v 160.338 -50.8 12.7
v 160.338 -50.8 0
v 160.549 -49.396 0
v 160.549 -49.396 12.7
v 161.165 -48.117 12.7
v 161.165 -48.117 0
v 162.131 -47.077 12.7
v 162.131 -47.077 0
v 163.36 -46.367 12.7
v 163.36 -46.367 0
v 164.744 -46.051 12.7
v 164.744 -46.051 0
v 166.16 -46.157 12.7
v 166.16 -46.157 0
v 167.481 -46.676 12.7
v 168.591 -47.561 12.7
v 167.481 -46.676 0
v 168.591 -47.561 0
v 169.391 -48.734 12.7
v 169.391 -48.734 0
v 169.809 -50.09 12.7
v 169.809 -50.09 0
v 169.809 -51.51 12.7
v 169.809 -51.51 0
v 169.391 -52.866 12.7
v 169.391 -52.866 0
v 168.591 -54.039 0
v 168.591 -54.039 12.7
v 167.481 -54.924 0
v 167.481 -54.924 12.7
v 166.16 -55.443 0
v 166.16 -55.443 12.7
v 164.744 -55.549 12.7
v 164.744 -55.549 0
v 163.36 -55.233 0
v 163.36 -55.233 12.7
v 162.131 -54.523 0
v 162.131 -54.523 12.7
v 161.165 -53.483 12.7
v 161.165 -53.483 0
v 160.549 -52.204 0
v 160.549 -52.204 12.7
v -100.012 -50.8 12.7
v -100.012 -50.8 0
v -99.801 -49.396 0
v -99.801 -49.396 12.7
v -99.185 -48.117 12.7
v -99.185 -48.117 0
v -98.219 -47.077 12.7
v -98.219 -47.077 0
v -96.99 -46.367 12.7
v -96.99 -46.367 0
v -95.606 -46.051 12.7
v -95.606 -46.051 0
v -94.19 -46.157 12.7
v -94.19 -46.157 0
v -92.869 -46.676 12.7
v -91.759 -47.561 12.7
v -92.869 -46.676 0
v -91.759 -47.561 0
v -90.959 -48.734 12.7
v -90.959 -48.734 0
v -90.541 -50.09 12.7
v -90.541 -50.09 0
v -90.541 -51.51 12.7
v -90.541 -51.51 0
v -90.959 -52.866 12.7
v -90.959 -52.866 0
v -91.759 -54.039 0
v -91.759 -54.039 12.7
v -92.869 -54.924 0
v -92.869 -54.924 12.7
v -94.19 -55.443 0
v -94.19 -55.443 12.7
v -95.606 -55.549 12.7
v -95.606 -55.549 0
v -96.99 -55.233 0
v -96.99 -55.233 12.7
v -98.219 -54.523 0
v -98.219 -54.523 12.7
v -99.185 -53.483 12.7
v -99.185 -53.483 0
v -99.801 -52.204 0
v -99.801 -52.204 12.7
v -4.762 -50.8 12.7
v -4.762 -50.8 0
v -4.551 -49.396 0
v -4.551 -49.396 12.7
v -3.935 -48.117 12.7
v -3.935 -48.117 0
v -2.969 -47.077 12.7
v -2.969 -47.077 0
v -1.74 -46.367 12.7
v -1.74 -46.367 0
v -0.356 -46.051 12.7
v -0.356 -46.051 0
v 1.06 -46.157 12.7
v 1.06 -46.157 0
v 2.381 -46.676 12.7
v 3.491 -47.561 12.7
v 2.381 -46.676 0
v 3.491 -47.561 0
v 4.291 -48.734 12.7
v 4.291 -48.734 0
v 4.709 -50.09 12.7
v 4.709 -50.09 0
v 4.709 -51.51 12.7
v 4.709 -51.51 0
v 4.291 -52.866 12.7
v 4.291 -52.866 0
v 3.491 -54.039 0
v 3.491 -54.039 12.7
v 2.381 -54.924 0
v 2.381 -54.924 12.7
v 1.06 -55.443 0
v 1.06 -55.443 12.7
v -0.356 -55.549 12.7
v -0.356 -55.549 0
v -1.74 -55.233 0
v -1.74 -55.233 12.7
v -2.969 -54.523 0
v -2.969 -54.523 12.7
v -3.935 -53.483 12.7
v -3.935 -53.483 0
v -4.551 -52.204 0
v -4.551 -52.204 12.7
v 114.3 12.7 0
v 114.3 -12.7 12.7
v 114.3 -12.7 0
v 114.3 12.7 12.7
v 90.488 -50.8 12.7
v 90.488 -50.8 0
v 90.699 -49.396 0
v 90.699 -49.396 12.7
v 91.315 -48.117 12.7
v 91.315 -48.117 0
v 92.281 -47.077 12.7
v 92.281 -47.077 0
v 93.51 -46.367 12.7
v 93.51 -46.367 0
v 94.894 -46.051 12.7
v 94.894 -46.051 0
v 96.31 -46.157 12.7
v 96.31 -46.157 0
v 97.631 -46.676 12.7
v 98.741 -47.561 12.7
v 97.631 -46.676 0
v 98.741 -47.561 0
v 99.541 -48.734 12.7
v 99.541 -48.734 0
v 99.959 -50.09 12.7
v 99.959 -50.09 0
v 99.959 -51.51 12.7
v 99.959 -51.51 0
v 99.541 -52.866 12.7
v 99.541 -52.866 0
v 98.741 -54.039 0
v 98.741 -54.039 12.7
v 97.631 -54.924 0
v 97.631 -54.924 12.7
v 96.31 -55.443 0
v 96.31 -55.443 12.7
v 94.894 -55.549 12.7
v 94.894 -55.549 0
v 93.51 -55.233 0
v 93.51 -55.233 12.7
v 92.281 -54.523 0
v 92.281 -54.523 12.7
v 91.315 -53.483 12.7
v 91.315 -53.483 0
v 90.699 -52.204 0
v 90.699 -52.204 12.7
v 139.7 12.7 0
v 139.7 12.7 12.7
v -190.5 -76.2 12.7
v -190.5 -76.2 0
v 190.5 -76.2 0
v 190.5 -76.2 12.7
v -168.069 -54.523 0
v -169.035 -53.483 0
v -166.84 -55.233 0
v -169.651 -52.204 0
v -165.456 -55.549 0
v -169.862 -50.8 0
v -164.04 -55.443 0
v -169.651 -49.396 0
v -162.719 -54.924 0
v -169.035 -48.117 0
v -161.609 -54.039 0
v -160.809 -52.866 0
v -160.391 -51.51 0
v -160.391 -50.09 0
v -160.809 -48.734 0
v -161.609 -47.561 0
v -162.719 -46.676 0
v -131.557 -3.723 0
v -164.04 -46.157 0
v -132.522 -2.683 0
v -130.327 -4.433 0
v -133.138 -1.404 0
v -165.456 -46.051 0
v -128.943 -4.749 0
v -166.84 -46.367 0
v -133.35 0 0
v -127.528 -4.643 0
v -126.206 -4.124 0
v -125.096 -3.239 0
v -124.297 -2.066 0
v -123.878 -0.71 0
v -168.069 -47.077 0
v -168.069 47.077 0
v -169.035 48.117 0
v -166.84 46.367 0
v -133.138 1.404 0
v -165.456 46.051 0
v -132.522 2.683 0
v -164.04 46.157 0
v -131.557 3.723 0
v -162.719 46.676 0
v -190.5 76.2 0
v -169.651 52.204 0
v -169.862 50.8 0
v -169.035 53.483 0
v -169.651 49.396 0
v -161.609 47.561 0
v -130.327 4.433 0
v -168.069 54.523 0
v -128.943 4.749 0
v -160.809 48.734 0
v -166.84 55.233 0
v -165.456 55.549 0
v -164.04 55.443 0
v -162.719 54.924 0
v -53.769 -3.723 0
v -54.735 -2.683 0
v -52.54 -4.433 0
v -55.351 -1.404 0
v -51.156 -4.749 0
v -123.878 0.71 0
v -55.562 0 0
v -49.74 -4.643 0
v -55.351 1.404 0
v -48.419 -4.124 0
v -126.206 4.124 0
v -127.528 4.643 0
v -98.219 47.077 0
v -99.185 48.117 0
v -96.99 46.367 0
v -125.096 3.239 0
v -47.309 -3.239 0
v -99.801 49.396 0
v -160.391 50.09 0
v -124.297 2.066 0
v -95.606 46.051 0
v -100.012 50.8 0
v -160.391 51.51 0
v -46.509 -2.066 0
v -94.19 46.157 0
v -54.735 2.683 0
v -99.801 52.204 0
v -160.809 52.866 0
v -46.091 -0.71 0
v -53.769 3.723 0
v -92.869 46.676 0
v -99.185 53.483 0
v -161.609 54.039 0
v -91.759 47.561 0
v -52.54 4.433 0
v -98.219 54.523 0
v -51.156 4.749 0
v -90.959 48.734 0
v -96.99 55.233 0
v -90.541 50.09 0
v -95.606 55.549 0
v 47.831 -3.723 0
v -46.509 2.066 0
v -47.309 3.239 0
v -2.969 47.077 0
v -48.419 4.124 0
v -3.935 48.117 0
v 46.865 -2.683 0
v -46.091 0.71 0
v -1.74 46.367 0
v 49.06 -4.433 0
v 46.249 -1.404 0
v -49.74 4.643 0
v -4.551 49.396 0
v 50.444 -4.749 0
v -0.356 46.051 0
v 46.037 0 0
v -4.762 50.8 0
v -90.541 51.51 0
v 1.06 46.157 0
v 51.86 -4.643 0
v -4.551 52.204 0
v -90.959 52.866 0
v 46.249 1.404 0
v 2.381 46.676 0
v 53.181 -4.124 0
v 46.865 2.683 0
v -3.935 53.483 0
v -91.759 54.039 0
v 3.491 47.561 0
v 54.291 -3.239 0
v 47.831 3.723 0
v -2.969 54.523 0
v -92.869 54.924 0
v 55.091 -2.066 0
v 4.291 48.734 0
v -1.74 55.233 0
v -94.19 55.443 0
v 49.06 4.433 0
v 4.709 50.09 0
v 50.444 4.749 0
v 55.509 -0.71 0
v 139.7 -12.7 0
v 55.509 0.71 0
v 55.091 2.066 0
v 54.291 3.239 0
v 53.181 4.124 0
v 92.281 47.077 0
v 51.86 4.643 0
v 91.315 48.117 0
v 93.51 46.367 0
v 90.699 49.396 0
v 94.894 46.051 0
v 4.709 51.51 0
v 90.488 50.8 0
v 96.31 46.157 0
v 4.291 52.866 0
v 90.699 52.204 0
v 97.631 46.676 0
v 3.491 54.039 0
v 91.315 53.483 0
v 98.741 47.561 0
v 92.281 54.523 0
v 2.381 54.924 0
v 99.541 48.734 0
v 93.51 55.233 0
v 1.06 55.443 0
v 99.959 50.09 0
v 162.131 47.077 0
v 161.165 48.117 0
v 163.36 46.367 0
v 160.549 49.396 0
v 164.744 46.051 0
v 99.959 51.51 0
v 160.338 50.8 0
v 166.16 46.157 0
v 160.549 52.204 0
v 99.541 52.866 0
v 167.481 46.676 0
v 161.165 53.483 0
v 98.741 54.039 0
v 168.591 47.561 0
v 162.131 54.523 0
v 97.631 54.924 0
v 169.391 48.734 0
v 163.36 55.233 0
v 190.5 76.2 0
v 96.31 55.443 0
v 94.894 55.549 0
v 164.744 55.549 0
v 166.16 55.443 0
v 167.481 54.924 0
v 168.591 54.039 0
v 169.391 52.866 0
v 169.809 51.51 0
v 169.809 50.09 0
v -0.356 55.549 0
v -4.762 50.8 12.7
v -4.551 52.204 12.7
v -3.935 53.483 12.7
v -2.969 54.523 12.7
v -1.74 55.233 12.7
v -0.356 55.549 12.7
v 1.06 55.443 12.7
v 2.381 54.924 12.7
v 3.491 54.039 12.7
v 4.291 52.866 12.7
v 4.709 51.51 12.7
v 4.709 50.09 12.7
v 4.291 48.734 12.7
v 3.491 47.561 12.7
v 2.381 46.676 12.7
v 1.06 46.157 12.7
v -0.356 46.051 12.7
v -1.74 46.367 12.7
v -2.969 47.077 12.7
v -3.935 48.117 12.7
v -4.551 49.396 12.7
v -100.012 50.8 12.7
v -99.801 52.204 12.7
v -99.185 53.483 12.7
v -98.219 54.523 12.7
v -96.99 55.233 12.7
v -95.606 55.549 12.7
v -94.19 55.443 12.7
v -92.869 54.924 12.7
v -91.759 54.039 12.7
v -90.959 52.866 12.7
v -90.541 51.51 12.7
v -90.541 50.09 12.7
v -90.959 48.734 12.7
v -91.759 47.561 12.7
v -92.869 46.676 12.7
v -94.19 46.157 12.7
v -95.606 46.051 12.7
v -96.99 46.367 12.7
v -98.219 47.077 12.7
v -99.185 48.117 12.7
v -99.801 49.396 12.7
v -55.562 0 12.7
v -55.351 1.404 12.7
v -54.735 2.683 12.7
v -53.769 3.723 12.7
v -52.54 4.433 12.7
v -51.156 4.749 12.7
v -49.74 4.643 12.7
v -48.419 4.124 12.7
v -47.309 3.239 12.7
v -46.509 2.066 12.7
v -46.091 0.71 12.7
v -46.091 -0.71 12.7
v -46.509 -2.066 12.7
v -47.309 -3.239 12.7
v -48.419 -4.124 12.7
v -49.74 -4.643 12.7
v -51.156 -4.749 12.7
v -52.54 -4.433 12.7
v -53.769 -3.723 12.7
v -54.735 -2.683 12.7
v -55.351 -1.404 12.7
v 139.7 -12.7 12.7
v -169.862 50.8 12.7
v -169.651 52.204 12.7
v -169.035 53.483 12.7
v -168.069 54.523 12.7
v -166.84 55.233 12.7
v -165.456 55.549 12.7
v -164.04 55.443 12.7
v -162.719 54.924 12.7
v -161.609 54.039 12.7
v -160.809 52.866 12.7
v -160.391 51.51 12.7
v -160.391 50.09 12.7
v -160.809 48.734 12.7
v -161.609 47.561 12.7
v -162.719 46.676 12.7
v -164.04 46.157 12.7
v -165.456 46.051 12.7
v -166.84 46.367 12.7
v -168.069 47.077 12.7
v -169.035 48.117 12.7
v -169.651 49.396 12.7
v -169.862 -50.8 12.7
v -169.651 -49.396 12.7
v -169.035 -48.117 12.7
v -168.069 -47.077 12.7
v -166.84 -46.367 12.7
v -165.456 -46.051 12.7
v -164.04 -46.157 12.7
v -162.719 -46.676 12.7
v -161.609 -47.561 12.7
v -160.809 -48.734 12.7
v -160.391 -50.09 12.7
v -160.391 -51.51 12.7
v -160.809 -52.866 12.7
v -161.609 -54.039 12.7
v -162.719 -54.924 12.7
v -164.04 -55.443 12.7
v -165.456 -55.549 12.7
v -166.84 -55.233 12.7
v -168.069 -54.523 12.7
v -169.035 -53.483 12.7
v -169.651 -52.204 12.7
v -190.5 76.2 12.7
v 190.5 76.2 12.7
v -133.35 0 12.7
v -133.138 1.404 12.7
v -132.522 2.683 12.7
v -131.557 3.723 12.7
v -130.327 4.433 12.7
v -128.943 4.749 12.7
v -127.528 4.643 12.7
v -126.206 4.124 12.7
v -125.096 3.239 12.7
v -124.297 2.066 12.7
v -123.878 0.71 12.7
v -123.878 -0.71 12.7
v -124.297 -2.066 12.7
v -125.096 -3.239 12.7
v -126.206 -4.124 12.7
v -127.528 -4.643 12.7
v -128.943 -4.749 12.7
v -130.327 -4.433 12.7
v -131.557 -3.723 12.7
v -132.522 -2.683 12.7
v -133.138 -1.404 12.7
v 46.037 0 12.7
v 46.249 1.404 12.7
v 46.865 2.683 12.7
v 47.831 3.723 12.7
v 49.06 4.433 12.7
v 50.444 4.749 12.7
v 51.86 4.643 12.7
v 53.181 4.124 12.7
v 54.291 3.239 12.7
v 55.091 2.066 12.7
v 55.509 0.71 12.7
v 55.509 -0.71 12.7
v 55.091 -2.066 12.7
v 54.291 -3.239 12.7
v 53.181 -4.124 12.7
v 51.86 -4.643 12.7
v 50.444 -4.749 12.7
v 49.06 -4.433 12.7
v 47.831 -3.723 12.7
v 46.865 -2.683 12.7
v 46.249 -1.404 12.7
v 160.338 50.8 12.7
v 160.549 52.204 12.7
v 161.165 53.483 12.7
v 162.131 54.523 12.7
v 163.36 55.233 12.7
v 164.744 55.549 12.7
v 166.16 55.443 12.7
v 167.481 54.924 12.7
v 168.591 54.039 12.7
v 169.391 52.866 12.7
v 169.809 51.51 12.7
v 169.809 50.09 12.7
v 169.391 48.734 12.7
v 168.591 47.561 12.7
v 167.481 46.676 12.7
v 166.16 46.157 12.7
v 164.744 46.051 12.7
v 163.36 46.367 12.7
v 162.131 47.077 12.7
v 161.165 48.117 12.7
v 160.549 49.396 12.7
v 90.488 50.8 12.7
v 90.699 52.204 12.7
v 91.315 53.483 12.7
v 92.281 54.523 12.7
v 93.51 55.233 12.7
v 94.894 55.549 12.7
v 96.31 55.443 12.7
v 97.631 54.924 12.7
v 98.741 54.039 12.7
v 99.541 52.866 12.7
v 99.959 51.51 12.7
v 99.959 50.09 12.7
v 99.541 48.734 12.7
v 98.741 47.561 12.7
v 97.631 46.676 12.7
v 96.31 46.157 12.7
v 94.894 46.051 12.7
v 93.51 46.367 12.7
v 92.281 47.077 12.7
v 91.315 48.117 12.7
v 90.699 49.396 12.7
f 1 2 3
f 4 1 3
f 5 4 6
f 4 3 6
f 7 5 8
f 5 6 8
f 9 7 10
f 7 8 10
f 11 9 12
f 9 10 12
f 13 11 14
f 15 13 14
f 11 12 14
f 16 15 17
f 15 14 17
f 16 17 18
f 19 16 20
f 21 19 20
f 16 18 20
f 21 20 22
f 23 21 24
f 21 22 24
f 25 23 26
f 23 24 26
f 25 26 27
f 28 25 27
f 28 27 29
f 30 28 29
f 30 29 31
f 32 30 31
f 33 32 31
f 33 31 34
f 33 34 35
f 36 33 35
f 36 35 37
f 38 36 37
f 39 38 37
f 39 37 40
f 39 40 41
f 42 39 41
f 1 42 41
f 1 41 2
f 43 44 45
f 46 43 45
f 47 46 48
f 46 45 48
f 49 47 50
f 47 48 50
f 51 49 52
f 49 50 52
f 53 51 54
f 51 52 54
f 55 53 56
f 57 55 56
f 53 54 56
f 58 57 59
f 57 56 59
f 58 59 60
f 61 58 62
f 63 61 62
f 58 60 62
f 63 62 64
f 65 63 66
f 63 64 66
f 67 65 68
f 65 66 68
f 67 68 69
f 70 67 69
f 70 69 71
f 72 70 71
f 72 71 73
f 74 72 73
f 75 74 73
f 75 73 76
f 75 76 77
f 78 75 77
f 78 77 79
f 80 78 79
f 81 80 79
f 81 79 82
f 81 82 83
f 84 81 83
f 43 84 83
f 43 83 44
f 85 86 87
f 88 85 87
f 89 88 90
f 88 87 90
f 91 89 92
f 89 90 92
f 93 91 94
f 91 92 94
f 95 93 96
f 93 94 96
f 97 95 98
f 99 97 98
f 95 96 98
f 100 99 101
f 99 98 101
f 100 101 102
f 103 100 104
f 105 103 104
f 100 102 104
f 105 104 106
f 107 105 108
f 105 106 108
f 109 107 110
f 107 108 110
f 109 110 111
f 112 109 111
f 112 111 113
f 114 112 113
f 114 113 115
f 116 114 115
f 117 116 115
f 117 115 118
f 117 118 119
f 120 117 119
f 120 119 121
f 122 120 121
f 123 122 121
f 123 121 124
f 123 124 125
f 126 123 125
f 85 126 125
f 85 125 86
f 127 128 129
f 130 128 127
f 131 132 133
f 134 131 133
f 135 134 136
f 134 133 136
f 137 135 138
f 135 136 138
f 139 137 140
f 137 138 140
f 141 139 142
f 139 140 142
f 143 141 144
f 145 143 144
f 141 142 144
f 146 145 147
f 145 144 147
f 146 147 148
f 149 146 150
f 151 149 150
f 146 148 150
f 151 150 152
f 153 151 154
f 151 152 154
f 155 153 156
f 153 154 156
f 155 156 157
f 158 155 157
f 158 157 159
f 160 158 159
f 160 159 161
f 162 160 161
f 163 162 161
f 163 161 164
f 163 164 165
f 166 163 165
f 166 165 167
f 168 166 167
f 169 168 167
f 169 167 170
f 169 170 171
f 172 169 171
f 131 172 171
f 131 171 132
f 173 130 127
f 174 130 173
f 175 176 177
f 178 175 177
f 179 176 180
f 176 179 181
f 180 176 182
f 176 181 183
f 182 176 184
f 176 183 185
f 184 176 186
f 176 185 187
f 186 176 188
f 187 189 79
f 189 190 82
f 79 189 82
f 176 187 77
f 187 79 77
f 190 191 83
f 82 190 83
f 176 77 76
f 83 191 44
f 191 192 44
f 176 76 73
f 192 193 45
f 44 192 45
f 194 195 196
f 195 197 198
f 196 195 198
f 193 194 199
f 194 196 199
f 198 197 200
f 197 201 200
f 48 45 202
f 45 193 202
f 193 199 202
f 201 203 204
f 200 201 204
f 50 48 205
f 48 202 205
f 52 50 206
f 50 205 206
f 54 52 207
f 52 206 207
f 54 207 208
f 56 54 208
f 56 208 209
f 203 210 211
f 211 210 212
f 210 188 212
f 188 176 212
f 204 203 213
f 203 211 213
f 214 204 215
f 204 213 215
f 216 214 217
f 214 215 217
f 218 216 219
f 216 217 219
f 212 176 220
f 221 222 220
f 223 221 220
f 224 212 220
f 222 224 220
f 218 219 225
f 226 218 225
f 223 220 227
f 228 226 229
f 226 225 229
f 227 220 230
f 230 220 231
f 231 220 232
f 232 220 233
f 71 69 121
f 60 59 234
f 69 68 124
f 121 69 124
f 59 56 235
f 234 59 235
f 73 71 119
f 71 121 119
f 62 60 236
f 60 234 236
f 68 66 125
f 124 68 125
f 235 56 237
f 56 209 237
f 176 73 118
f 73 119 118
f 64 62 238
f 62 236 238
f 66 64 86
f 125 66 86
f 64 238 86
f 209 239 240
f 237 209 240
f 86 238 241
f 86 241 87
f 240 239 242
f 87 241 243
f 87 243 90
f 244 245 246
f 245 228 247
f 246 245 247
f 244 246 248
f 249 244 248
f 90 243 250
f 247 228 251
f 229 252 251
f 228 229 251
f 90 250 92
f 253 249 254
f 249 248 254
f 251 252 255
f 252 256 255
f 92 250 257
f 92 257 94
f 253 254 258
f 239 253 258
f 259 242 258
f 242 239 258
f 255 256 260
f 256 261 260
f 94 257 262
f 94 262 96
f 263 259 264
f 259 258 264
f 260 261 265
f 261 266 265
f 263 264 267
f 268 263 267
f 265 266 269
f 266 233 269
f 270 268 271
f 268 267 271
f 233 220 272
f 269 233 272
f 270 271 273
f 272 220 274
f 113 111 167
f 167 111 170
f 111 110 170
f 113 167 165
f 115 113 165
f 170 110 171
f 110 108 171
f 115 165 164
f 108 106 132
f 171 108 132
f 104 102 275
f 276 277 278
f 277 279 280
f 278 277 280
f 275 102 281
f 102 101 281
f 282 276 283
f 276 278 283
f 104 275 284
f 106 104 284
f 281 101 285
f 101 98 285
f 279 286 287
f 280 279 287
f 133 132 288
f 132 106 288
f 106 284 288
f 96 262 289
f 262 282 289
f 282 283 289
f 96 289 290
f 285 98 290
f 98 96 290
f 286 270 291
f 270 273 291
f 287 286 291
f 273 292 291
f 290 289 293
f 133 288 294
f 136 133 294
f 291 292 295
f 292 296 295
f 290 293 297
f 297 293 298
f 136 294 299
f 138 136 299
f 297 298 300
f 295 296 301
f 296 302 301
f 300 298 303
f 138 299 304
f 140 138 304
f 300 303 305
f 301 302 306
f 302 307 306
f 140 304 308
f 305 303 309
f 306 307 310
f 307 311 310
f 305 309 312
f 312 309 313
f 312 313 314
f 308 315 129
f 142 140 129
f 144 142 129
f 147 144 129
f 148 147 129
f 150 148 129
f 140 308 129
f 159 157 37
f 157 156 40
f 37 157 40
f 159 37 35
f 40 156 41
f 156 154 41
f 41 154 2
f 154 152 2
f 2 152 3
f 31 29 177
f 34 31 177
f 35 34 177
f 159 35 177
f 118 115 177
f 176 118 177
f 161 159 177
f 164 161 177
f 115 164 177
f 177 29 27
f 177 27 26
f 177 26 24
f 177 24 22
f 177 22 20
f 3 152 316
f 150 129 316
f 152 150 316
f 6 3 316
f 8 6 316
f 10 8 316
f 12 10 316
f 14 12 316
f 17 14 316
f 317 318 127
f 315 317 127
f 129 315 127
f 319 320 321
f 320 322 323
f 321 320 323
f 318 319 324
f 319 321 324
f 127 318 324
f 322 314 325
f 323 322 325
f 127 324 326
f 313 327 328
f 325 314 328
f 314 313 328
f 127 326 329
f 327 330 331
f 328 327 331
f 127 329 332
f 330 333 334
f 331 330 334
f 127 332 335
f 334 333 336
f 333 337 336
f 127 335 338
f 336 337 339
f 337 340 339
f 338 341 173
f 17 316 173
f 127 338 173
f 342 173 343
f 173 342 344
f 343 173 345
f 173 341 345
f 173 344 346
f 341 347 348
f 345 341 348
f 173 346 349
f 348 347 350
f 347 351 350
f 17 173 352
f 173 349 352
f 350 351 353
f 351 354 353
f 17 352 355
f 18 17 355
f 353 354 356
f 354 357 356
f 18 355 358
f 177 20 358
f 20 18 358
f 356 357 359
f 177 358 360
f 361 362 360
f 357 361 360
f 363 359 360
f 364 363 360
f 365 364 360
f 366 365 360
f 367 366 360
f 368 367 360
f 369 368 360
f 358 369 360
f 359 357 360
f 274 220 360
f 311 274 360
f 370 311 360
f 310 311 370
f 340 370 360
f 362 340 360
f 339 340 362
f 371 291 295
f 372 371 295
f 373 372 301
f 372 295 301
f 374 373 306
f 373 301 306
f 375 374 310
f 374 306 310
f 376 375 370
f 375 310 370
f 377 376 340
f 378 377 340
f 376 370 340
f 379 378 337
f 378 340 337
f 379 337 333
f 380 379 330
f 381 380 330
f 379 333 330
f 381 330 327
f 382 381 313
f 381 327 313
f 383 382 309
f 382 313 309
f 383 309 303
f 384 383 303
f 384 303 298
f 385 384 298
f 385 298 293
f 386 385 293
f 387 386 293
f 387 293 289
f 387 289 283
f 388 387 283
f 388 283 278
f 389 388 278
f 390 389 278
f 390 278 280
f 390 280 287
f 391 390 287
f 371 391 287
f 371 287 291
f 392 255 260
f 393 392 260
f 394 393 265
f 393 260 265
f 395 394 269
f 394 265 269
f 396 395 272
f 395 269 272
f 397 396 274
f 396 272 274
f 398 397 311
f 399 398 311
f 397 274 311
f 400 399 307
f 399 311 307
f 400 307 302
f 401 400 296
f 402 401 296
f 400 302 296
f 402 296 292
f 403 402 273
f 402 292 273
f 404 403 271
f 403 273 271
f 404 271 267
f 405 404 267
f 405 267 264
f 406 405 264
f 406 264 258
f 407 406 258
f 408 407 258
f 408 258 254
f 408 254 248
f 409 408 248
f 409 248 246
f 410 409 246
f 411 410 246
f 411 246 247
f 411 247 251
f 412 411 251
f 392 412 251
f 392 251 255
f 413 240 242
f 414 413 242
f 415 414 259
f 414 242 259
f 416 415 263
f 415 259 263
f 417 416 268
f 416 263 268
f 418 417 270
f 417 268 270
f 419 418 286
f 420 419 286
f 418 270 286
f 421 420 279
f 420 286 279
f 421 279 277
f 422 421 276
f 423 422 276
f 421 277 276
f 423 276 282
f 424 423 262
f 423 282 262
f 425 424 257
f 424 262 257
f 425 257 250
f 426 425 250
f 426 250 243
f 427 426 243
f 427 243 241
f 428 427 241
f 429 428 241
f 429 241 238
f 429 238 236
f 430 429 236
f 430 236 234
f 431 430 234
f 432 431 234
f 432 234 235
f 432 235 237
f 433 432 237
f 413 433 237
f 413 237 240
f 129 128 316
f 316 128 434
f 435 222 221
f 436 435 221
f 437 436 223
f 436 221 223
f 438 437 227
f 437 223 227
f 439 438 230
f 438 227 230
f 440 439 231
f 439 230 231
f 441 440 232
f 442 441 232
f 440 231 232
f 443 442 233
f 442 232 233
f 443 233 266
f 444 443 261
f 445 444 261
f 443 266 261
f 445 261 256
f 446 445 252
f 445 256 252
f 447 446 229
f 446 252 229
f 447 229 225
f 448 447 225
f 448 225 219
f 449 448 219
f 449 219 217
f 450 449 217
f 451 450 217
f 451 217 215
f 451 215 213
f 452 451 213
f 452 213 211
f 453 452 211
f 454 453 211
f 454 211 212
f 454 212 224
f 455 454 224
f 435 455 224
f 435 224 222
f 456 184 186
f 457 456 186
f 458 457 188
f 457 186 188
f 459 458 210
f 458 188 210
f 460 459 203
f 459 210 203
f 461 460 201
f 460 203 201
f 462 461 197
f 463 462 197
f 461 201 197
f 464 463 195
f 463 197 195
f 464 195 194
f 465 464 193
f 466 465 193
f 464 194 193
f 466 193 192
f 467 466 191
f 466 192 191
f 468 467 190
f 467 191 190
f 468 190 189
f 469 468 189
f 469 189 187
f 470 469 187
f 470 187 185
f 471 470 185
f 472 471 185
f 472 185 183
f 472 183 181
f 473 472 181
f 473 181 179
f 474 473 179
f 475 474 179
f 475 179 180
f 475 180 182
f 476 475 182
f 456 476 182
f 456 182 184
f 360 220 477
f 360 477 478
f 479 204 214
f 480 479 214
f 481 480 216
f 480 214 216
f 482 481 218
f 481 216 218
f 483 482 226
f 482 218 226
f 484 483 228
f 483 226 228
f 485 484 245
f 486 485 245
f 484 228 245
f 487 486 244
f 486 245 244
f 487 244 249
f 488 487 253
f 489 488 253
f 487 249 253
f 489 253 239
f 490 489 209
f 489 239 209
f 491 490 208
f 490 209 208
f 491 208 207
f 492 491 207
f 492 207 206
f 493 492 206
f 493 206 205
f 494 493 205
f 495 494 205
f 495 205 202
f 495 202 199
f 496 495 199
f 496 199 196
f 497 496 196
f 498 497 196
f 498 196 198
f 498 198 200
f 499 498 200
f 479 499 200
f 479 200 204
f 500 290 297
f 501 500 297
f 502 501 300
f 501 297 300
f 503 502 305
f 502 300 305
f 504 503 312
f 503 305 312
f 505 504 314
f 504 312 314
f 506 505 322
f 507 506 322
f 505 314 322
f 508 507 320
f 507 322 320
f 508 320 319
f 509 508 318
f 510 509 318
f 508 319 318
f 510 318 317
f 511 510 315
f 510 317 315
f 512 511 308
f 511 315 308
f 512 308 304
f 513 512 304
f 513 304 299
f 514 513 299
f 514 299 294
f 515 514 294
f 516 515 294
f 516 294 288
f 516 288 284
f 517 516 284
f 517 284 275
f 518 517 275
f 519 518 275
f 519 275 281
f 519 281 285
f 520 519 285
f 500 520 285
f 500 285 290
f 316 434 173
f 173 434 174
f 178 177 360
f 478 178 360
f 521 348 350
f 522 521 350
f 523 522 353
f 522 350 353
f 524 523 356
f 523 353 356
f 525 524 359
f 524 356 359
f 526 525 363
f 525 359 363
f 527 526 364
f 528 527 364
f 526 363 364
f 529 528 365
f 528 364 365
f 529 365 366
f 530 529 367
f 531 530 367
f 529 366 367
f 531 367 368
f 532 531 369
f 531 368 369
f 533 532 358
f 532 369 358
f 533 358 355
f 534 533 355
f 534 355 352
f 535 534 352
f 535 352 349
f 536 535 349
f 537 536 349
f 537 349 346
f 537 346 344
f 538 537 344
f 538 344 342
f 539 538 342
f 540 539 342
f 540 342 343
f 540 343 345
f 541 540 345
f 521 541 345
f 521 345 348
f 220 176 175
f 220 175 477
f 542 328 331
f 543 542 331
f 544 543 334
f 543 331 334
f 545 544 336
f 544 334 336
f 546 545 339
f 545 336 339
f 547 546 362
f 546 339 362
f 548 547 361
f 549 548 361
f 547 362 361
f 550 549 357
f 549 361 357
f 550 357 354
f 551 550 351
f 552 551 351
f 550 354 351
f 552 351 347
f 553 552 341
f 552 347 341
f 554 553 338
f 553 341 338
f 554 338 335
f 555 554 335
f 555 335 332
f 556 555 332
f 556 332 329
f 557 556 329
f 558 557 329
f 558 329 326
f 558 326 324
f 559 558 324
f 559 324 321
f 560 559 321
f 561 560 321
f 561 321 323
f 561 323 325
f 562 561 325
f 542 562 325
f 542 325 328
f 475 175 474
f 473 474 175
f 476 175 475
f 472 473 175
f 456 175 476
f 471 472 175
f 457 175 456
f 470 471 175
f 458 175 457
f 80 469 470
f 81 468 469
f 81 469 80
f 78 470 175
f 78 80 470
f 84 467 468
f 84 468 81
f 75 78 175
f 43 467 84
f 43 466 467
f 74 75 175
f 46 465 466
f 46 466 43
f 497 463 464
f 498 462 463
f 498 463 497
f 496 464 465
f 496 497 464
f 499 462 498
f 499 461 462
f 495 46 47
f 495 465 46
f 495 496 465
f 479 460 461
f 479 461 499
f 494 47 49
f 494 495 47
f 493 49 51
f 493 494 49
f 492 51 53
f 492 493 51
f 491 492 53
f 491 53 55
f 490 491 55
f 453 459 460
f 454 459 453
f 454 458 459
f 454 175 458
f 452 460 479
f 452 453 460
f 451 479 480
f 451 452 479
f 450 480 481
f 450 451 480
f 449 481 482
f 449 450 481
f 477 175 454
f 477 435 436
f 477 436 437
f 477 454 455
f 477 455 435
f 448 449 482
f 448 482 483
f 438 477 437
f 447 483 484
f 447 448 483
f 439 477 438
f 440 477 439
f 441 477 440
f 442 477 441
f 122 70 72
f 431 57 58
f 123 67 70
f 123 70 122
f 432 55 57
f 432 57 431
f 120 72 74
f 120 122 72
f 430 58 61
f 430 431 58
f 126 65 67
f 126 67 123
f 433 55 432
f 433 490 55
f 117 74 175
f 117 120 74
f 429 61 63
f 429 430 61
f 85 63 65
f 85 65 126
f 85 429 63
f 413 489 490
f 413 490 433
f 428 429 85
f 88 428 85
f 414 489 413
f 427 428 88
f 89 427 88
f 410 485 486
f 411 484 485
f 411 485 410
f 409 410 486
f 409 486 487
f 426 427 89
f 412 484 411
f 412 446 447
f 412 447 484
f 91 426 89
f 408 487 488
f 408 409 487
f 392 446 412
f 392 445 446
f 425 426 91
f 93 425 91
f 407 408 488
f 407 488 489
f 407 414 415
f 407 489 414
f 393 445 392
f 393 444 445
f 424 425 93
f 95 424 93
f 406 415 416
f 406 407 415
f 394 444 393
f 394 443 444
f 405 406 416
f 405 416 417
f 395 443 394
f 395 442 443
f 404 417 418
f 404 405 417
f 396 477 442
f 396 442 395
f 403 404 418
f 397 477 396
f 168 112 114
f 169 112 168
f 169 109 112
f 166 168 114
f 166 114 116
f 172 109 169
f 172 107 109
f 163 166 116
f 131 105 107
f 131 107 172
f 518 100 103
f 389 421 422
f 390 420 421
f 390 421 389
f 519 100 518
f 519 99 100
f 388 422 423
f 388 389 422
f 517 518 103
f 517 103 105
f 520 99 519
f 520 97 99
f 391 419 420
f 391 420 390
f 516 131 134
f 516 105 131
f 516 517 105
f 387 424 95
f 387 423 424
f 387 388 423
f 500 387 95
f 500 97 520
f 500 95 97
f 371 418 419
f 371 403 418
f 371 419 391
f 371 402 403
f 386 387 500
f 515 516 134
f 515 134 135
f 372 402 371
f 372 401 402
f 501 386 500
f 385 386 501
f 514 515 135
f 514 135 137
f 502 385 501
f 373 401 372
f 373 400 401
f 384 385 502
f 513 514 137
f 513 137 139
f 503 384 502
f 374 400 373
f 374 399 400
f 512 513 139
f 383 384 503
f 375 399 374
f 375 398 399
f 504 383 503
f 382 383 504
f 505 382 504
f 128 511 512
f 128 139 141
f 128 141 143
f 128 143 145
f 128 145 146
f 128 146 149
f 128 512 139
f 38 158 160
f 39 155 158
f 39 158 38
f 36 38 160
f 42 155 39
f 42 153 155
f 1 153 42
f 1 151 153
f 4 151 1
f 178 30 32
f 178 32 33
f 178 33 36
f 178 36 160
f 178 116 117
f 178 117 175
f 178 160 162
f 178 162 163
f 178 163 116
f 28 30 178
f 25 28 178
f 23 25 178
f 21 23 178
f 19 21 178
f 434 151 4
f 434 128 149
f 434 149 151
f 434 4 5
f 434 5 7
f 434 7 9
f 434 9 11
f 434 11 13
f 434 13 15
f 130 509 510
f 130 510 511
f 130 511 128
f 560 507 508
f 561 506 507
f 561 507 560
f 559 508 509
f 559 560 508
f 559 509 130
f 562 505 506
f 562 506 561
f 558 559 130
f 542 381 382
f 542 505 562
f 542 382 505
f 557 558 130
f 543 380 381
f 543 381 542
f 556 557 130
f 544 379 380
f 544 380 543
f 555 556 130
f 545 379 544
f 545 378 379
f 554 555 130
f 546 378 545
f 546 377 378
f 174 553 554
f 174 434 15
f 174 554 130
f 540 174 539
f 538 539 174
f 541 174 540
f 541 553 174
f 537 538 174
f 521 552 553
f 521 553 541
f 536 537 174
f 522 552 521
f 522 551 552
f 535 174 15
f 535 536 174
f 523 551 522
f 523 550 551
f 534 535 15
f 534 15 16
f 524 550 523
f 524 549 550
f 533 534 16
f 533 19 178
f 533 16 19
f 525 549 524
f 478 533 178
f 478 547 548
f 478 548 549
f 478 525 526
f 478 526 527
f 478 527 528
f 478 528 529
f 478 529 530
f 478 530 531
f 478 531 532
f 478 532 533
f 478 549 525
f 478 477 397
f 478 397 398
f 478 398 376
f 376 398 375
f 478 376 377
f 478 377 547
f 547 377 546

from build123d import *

# Parameters (mm, degrees)
F0_W     = 381
F0_H     = 152.4
F1_DEPTH = 12.7
F3_D     = 9.525
F4_D     = 9.525
F5_W     = 25.4
F5_H     = 25.4
F6_DEPTH = 12.7


with BuildPart() as f1:
    # F0 (on Top) → F1 (new body)
    with BuildSketch(Plane.XY):
        Rectangle(F0_W, F0_H)
    extrude(amount=F1_DEPTH)

    # F3 (through all)
    with Locations(Plane.XY.offset(12.7)):
        with Locations((-165.1, 50.8)):
            Hole(F3_D / 2)

    # F4 (through all)
    with Locations(Plane.XY.offset(12.7)):
        with Locations((-95.25, 50.8), (0, 50.8), (95.25, 50.8), (165.1, 50.8), (128.5875, 0), (50.8, 0), (-50.8, 0), (-128.5875, 0), (-165.1, -50.8), (-95.25, -50.8), (0, -50.8), (95.25, -50.8), (165.1, -50.8)):
            Hole(F4_D / 2)

    # F5 (on face) → F6 (cut)
    with BuildSketch(Plane.XY.offset(12.7)):
        with Locations((127, 0)):
            Rectangle(F5_W, F5_H)
    extrude(amount=-F6_DEPTH, mode=Mode.SUBTRACT)


solid = f1.part
